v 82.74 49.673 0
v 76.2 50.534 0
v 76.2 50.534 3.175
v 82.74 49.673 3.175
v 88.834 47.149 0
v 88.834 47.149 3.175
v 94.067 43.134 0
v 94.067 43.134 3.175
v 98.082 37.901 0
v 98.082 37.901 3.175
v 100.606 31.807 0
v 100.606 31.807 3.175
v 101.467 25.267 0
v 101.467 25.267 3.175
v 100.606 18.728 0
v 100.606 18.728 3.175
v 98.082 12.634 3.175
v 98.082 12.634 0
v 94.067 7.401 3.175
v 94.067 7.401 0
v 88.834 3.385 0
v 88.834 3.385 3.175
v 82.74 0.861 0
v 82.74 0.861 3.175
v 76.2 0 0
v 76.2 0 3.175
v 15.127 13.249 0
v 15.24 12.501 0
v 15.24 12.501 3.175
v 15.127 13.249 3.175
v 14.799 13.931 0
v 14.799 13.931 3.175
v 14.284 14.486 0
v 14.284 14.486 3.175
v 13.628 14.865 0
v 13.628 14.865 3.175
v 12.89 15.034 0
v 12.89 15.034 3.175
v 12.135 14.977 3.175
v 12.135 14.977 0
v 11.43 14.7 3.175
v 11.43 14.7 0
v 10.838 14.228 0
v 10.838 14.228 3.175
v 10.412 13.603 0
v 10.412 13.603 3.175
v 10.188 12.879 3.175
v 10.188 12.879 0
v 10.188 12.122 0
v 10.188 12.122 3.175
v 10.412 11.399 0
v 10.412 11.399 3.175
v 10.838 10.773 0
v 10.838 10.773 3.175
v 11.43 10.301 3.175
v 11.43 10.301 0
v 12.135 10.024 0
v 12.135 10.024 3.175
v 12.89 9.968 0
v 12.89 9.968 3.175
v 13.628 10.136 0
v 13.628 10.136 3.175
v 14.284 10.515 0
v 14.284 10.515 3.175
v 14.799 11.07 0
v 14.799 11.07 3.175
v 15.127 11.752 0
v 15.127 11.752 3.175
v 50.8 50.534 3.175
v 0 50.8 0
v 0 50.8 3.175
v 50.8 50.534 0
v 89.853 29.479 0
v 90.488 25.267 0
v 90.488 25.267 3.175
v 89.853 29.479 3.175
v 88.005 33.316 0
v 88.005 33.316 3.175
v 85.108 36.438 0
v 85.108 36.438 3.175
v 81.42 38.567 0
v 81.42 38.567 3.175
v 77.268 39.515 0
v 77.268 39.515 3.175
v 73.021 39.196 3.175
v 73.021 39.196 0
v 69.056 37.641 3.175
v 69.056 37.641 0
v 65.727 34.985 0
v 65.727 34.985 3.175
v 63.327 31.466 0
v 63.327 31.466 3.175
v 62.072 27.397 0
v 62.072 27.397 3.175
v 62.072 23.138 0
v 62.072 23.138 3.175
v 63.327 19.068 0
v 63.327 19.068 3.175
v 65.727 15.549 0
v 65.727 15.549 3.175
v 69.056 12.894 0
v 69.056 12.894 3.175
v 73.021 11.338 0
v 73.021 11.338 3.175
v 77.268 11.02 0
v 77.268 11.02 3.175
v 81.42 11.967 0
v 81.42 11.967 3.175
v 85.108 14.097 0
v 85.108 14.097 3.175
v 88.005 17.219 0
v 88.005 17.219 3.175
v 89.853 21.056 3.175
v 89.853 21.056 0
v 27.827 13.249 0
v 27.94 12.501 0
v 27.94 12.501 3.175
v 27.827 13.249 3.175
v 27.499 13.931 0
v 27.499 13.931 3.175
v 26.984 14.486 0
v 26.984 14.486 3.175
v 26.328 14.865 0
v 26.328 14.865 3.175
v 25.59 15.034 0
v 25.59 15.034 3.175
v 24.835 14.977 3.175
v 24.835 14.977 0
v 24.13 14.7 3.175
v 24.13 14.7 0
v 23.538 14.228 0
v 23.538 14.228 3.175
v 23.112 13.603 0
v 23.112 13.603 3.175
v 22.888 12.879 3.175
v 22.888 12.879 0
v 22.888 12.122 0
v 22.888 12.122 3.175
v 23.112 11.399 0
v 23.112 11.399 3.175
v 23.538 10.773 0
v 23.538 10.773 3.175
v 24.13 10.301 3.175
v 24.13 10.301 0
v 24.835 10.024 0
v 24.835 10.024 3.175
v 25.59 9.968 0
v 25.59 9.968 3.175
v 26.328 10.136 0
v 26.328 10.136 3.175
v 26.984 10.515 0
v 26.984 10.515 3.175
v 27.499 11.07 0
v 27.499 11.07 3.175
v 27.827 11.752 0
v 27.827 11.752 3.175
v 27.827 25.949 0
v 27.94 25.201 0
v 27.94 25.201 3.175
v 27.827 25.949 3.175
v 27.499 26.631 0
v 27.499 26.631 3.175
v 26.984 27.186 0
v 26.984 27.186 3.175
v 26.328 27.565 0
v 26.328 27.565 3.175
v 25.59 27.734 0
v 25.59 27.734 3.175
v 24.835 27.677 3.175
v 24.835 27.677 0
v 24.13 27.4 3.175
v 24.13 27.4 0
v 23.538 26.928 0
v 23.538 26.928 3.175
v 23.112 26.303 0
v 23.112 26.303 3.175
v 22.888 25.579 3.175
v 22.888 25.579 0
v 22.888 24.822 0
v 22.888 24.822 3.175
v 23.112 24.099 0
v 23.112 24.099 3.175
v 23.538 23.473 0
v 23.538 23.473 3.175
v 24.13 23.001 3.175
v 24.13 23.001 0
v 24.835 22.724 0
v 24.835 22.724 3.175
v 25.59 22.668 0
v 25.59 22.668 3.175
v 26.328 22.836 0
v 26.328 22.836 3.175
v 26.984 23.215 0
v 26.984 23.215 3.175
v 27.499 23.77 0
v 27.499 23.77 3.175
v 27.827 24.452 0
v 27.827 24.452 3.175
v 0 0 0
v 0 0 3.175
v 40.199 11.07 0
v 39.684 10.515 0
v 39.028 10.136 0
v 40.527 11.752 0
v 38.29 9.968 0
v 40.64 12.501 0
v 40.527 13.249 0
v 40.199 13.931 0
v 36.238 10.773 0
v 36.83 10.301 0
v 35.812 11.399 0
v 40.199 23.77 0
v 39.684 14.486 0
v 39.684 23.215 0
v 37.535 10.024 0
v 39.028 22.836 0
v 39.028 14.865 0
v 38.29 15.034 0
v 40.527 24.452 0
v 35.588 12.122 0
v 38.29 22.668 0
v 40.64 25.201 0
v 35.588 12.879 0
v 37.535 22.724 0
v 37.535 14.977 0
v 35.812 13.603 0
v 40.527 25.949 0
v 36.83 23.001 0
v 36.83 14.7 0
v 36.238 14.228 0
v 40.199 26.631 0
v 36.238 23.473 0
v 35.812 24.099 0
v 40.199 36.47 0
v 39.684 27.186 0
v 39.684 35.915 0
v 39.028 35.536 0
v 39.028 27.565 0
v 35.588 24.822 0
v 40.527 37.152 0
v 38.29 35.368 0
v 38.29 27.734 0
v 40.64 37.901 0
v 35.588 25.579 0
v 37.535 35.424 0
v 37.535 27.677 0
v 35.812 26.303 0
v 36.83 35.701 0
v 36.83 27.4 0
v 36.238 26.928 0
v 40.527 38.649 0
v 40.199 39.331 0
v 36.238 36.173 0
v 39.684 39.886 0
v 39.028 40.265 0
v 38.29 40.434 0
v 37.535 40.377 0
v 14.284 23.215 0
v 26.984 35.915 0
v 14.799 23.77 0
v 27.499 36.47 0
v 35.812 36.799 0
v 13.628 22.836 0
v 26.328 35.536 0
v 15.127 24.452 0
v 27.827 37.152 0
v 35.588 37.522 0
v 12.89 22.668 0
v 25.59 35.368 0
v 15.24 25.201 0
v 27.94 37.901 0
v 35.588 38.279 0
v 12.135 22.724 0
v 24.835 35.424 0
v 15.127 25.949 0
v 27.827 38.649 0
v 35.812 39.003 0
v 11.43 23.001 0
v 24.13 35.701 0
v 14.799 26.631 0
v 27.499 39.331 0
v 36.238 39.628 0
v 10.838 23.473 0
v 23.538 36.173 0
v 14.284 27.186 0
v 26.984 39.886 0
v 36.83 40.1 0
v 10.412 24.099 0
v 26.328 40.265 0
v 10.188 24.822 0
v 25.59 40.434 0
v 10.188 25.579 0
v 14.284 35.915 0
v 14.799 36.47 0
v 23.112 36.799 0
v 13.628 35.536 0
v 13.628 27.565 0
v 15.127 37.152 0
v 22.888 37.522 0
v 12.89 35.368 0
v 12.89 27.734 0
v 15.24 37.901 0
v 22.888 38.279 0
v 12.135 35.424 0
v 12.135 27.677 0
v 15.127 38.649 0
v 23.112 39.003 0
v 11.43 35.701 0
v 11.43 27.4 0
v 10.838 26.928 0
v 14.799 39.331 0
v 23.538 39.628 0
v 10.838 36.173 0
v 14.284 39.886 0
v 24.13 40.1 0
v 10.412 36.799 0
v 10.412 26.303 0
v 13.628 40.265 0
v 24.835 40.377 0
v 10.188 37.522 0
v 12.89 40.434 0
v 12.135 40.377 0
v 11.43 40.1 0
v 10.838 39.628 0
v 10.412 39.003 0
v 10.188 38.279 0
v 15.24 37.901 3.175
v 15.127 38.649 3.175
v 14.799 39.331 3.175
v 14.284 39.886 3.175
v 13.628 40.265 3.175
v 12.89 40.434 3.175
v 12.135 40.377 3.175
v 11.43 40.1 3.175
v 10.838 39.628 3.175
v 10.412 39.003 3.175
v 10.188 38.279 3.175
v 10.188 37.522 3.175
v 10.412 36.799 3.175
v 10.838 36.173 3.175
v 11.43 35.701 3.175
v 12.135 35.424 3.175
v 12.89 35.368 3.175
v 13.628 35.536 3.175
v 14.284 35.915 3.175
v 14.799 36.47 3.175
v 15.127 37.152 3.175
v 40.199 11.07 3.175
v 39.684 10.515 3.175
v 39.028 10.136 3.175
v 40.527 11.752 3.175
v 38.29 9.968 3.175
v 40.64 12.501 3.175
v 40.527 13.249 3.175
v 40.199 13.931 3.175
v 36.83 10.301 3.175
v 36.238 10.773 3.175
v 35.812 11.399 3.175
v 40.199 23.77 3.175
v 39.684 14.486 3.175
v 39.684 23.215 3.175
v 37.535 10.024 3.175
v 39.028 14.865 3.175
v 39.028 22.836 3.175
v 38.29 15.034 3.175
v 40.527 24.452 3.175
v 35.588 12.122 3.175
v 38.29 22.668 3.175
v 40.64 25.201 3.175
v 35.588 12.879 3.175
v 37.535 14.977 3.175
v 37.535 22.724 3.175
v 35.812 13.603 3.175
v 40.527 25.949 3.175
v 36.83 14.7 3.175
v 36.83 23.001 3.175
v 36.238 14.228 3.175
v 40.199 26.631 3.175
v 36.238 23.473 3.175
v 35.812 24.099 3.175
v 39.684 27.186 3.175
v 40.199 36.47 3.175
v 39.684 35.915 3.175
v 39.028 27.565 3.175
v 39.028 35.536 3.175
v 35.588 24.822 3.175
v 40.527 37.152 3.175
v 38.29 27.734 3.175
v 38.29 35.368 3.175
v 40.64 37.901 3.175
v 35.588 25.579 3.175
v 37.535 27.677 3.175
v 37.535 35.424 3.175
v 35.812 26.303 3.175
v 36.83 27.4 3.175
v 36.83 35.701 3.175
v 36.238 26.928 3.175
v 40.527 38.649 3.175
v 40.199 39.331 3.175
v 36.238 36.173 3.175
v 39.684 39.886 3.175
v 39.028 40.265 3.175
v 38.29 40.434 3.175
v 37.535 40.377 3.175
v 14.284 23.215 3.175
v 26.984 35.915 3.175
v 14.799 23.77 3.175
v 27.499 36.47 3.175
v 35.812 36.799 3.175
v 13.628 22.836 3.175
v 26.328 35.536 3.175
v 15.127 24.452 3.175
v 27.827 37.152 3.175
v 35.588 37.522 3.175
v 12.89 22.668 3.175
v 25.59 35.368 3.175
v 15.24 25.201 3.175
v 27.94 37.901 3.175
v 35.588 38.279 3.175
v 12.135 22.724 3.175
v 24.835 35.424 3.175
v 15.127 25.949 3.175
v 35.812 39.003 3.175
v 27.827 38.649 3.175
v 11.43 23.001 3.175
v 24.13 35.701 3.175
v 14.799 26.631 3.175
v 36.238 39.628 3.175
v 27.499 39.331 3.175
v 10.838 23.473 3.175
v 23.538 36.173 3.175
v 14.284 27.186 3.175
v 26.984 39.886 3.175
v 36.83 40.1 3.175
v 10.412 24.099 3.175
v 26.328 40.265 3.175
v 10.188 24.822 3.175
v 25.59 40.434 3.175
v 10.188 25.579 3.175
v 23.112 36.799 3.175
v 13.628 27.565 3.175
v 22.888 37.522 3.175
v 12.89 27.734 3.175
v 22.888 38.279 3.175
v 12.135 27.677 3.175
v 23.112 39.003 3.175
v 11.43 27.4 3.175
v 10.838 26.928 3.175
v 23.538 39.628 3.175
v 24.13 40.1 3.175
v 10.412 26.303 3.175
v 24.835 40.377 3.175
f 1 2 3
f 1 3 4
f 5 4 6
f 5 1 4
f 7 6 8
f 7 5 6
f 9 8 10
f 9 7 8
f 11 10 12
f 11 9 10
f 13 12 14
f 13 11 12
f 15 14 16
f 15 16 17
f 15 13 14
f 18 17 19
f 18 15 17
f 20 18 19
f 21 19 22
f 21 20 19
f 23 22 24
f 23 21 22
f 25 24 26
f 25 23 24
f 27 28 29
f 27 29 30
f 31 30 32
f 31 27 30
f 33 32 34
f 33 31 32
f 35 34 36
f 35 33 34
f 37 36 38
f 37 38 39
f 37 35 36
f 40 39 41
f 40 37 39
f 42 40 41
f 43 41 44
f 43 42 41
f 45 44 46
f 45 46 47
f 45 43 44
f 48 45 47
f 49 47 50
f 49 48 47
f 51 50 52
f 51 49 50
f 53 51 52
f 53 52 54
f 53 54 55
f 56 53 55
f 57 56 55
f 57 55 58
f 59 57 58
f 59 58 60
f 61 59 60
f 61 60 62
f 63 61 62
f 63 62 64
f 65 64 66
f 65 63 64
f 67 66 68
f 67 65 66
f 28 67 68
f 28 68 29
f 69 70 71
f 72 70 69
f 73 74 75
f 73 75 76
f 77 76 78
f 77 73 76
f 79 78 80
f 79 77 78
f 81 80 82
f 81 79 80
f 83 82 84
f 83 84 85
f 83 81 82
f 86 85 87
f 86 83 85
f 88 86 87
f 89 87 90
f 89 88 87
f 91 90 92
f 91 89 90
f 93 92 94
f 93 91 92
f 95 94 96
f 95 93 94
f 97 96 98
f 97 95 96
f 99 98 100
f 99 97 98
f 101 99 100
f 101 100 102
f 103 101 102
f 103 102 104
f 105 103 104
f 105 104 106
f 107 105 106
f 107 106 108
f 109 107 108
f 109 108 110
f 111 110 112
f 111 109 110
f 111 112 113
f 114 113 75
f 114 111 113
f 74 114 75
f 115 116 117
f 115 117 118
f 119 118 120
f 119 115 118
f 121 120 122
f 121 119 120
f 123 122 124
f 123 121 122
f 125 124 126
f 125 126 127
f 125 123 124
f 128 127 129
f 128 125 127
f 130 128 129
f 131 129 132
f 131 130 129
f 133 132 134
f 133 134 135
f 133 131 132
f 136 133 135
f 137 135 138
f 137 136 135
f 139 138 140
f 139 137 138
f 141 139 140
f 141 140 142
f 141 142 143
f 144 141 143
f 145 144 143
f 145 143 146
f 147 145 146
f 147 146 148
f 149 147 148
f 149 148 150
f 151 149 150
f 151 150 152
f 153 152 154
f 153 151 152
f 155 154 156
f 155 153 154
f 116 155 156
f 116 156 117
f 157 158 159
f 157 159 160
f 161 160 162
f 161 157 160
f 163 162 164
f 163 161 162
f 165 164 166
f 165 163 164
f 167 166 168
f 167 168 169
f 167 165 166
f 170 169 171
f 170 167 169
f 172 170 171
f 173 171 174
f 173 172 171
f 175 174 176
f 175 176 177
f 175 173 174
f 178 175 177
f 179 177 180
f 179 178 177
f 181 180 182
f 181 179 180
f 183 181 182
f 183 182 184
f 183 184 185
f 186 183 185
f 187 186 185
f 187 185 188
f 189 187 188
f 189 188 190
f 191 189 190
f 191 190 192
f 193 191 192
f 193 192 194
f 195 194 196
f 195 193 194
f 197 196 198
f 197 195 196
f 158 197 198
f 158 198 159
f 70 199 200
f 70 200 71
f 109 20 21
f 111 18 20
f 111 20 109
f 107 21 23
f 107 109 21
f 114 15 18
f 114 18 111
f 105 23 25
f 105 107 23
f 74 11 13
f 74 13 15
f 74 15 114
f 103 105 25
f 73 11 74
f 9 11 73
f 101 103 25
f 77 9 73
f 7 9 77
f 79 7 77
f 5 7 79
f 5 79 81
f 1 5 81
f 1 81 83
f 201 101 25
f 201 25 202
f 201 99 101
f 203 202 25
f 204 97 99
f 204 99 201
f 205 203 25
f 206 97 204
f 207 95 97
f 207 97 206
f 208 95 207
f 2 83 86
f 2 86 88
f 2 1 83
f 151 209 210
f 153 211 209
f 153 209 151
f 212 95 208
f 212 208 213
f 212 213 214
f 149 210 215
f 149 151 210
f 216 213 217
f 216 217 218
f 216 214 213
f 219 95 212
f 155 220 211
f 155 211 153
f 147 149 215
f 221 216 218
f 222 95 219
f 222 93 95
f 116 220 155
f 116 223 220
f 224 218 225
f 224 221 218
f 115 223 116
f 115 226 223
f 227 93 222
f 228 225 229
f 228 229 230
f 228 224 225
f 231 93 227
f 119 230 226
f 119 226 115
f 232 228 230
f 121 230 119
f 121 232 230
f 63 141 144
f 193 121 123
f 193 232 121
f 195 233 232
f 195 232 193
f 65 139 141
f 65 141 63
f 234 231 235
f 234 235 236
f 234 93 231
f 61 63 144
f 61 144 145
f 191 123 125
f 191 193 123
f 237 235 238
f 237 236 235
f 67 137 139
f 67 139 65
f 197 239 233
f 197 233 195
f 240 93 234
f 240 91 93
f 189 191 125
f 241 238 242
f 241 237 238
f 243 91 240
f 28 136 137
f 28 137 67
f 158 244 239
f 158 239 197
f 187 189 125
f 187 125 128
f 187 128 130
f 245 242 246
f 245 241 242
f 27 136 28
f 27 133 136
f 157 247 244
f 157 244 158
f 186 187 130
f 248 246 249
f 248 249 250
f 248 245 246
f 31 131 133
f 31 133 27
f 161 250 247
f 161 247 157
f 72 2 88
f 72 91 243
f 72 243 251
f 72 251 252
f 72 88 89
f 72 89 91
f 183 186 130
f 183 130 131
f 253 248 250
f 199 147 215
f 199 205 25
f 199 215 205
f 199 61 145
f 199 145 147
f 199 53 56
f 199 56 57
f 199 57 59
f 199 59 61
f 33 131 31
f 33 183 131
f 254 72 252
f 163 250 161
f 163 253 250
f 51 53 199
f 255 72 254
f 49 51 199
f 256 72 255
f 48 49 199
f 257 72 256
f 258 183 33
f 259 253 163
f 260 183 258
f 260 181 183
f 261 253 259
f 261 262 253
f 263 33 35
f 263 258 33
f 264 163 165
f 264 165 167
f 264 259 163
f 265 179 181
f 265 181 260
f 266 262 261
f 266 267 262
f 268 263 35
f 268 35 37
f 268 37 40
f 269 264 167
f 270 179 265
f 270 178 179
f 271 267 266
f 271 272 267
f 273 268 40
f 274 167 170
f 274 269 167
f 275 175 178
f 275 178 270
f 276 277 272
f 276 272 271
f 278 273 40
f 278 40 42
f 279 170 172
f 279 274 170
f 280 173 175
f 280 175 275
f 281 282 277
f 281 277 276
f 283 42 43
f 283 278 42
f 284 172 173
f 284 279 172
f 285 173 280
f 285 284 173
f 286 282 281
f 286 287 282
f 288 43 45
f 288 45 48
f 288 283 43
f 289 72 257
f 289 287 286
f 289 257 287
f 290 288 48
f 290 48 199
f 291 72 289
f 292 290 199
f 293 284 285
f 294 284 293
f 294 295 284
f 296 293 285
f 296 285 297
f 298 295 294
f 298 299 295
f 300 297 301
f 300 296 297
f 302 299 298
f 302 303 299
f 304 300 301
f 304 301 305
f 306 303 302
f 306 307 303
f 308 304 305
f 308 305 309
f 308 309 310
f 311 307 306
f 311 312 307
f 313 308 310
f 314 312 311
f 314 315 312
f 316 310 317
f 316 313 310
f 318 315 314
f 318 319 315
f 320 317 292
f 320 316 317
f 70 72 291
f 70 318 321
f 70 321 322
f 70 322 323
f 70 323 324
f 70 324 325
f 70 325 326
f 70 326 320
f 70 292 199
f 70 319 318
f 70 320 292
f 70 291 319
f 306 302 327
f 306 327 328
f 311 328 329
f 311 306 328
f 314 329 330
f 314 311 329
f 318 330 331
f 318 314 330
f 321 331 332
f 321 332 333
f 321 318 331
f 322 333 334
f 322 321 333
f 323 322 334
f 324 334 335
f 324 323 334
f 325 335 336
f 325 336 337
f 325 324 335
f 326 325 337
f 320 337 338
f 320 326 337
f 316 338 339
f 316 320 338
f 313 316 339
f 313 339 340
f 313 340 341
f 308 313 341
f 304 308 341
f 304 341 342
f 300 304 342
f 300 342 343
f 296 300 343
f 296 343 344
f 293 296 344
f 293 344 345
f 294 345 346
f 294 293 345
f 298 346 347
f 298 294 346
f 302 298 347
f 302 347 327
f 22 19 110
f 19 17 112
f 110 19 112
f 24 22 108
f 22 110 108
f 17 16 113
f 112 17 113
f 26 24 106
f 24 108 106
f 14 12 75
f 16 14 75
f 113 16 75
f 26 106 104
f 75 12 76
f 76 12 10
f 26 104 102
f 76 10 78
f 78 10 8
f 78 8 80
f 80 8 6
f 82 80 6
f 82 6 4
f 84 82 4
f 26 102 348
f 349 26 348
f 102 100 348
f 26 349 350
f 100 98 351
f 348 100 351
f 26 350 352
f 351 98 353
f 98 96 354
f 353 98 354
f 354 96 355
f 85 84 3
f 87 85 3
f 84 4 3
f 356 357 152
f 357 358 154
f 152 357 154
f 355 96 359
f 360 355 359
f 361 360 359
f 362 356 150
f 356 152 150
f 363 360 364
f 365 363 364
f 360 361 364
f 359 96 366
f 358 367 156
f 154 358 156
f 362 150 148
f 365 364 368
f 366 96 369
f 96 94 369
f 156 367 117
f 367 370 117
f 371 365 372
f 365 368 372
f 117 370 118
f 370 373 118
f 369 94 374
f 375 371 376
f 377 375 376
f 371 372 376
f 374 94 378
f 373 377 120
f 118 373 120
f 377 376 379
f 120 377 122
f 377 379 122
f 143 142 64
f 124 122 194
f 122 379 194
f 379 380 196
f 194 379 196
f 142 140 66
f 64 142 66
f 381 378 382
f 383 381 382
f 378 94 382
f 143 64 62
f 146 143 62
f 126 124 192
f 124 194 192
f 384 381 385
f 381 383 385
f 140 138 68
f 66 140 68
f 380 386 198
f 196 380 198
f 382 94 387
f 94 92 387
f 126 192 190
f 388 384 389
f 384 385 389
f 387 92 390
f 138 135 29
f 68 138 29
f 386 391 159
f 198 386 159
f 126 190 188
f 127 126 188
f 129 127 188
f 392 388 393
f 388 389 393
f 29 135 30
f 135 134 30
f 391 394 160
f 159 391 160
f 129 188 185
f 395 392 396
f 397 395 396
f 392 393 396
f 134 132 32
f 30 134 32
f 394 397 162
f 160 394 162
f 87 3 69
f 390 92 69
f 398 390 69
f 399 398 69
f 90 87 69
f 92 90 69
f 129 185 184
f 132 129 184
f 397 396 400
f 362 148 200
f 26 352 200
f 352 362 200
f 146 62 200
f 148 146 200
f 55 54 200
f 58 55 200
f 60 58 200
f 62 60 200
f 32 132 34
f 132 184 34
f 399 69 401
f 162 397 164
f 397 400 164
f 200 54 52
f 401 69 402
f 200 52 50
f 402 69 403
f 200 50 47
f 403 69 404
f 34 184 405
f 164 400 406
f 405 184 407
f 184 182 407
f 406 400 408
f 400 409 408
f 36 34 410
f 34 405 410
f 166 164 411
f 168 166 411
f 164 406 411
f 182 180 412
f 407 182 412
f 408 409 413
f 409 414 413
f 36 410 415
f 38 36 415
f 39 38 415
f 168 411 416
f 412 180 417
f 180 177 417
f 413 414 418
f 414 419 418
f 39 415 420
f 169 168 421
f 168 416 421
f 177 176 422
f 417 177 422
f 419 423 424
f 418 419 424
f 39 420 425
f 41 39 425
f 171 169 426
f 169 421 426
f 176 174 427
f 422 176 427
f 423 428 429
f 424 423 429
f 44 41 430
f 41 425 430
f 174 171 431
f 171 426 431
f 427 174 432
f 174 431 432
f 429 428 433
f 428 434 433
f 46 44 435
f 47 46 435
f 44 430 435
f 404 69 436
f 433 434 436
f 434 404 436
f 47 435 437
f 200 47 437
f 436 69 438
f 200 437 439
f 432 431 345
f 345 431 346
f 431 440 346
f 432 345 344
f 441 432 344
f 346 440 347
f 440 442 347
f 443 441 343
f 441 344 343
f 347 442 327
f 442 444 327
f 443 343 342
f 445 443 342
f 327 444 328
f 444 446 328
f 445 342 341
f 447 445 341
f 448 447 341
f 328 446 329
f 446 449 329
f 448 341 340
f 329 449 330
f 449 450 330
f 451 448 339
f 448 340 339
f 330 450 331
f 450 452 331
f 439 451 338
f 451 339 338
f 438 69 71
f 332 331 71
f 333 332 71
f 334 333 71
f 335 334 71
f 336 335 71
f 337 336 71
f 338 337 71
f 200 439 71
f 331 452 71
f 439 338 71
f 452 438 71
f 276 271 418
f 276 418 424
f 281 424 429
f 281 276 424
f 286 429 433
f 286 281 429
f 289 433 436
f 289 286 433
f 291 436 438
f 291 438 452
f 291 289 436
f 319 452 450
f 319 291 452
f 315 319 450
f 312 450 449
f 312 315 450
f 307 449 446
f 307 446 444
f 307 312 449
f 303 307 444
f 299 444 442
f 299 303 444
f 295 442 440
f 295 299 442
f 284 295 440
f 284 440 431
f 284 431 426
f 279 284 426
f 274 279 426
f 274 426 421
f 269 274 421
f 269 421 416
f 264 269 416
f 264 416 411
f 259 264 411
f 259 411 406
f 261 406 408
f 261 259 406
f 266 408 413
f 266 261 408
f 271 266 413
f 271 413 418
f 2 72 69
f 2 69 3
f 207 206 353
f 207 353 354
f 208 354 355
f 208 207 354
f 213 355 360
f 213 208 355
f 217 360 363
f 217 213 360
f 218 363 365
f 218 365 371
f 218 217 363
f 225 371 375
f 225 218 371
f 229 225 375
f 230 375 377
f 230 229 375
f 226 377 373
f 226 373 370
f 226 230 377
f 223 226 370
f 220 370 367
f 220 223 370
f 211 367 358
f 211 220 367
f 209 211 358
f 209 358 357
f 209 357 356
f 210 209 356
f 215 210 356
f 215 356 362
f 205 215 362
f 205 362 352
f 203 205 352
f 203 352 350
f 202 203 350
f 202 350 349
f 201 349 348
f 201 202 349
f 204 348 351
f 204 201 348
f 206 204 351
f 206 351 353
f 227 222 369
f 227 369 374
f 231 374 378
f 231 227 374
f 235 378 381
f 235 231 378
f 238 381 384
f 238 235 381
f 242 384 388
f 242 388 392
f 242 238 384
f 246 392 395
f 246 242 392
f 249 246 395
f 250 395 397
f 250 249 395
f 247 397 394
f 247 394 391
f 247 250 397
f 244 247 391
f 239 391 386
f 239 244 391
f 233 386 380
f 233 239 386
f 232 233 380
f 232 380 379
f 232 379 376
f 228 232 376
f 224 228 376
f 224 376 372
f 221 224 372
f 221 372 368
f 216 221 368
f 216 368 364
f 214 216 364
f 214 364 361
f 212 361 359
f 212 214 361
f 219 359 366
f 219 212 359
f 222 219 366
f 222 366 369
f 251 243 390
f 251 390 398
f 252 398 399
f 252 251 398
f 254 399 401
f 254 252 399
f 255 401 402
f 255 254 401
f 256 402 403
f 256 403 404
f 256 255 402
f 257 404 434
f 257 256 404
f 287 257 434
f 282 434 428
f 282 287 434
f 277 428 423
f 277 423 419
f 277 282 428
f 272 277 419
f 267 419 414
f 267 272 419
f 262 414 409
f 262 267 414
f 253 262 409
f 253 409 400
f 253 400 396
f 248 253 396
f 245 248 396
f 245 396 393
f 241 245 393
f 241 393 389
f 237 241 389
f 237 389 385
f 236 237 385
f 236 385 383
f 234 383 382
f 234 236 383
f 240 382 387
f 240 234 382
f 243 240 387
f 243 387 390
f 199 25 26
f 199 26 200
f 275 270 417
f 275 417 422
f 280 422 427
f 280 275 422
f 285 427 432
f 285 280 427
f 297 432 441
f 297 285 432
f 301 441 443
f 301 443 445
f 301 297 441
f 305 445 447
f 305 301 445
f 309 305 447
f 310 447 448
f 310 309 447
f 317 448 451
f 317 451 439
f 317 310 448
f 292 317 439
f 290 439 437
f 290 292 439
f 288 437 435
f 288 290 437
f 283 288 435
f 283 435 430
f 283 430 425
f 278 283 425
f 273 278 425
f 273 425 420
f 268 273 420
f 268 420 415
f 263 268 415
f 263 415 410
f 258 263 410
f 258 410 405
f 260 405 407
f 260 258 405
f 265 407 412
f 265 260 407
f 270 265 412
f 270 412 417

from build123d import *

# Parameters (mm, degrees)
SKETCH1_R           = 2.54
SKETCH1_R_2         = 14.2875
BOSS_EXTRUDE1_DEPTH = 3.175


with BuildPart() as part:
    # Sketch1 → Boss-Extrude1 (new body)
    with BuildSketch(Plane.XY):
        with BuildLine():
            Line((0, 0), (0, 50.8))
            Line((0, 50.8), (50.8, 50.534405745))
            Line((50.8, 50.534405745), (76.2, 50.534405745))
            ThreePointArc((76.2, 50.534405745), (101.467202873, 25.267202873), (76.2, 0))
            Line((76.2, 0), (0, 0))
        make_face()
        with Locations((12.7, 37.900630736)):
            Circle(SKETCH1_R, mode=Mode.SUBTRACT)
        with Locations((25.4, 37.900630736)):
            Circle(SKETCH1_R, mode=Mode.SUBTRACT)
        with Locations((38.1, 37.900630736)):
            Circle(SKETCH1_R, mode=Mode.SUBTRACT)
        with Locations((25.4, 25.200630736)):
            Circle(SKETCH1_R, mode=Mode.SUBTRACT)
        with Locations((38.1, 25.200630736)):
            Circle(SKETCH1_R, mode=Mode.SUBTRACT)
        with Locations((25.4, 12.500630736)):
            Circle(SKETCH1_R, mode=Mode.SUBTRACT)
        with Locations((38.1, 12.500630736)):
            Circle(SKETCH1_R, mode=Mode.SUBTRACT)
        with Locations((12.7, 25.200630736)):
            Circle(SKETCH1_R, mode=Mode.SUBTRACT)
        with Locations((12.7, 12.500630736)):
            Circle(SKETCH1_R, mode=Mode.SUBTRACT)
        with Locations((76.2, 25.267202873)):
            Circle(SKETCH1_R_2, mode=Mode.SUBTRACT)
    extrude(amount=BOSS_EXTRUDE1_DEPTH)


solid = part.part
